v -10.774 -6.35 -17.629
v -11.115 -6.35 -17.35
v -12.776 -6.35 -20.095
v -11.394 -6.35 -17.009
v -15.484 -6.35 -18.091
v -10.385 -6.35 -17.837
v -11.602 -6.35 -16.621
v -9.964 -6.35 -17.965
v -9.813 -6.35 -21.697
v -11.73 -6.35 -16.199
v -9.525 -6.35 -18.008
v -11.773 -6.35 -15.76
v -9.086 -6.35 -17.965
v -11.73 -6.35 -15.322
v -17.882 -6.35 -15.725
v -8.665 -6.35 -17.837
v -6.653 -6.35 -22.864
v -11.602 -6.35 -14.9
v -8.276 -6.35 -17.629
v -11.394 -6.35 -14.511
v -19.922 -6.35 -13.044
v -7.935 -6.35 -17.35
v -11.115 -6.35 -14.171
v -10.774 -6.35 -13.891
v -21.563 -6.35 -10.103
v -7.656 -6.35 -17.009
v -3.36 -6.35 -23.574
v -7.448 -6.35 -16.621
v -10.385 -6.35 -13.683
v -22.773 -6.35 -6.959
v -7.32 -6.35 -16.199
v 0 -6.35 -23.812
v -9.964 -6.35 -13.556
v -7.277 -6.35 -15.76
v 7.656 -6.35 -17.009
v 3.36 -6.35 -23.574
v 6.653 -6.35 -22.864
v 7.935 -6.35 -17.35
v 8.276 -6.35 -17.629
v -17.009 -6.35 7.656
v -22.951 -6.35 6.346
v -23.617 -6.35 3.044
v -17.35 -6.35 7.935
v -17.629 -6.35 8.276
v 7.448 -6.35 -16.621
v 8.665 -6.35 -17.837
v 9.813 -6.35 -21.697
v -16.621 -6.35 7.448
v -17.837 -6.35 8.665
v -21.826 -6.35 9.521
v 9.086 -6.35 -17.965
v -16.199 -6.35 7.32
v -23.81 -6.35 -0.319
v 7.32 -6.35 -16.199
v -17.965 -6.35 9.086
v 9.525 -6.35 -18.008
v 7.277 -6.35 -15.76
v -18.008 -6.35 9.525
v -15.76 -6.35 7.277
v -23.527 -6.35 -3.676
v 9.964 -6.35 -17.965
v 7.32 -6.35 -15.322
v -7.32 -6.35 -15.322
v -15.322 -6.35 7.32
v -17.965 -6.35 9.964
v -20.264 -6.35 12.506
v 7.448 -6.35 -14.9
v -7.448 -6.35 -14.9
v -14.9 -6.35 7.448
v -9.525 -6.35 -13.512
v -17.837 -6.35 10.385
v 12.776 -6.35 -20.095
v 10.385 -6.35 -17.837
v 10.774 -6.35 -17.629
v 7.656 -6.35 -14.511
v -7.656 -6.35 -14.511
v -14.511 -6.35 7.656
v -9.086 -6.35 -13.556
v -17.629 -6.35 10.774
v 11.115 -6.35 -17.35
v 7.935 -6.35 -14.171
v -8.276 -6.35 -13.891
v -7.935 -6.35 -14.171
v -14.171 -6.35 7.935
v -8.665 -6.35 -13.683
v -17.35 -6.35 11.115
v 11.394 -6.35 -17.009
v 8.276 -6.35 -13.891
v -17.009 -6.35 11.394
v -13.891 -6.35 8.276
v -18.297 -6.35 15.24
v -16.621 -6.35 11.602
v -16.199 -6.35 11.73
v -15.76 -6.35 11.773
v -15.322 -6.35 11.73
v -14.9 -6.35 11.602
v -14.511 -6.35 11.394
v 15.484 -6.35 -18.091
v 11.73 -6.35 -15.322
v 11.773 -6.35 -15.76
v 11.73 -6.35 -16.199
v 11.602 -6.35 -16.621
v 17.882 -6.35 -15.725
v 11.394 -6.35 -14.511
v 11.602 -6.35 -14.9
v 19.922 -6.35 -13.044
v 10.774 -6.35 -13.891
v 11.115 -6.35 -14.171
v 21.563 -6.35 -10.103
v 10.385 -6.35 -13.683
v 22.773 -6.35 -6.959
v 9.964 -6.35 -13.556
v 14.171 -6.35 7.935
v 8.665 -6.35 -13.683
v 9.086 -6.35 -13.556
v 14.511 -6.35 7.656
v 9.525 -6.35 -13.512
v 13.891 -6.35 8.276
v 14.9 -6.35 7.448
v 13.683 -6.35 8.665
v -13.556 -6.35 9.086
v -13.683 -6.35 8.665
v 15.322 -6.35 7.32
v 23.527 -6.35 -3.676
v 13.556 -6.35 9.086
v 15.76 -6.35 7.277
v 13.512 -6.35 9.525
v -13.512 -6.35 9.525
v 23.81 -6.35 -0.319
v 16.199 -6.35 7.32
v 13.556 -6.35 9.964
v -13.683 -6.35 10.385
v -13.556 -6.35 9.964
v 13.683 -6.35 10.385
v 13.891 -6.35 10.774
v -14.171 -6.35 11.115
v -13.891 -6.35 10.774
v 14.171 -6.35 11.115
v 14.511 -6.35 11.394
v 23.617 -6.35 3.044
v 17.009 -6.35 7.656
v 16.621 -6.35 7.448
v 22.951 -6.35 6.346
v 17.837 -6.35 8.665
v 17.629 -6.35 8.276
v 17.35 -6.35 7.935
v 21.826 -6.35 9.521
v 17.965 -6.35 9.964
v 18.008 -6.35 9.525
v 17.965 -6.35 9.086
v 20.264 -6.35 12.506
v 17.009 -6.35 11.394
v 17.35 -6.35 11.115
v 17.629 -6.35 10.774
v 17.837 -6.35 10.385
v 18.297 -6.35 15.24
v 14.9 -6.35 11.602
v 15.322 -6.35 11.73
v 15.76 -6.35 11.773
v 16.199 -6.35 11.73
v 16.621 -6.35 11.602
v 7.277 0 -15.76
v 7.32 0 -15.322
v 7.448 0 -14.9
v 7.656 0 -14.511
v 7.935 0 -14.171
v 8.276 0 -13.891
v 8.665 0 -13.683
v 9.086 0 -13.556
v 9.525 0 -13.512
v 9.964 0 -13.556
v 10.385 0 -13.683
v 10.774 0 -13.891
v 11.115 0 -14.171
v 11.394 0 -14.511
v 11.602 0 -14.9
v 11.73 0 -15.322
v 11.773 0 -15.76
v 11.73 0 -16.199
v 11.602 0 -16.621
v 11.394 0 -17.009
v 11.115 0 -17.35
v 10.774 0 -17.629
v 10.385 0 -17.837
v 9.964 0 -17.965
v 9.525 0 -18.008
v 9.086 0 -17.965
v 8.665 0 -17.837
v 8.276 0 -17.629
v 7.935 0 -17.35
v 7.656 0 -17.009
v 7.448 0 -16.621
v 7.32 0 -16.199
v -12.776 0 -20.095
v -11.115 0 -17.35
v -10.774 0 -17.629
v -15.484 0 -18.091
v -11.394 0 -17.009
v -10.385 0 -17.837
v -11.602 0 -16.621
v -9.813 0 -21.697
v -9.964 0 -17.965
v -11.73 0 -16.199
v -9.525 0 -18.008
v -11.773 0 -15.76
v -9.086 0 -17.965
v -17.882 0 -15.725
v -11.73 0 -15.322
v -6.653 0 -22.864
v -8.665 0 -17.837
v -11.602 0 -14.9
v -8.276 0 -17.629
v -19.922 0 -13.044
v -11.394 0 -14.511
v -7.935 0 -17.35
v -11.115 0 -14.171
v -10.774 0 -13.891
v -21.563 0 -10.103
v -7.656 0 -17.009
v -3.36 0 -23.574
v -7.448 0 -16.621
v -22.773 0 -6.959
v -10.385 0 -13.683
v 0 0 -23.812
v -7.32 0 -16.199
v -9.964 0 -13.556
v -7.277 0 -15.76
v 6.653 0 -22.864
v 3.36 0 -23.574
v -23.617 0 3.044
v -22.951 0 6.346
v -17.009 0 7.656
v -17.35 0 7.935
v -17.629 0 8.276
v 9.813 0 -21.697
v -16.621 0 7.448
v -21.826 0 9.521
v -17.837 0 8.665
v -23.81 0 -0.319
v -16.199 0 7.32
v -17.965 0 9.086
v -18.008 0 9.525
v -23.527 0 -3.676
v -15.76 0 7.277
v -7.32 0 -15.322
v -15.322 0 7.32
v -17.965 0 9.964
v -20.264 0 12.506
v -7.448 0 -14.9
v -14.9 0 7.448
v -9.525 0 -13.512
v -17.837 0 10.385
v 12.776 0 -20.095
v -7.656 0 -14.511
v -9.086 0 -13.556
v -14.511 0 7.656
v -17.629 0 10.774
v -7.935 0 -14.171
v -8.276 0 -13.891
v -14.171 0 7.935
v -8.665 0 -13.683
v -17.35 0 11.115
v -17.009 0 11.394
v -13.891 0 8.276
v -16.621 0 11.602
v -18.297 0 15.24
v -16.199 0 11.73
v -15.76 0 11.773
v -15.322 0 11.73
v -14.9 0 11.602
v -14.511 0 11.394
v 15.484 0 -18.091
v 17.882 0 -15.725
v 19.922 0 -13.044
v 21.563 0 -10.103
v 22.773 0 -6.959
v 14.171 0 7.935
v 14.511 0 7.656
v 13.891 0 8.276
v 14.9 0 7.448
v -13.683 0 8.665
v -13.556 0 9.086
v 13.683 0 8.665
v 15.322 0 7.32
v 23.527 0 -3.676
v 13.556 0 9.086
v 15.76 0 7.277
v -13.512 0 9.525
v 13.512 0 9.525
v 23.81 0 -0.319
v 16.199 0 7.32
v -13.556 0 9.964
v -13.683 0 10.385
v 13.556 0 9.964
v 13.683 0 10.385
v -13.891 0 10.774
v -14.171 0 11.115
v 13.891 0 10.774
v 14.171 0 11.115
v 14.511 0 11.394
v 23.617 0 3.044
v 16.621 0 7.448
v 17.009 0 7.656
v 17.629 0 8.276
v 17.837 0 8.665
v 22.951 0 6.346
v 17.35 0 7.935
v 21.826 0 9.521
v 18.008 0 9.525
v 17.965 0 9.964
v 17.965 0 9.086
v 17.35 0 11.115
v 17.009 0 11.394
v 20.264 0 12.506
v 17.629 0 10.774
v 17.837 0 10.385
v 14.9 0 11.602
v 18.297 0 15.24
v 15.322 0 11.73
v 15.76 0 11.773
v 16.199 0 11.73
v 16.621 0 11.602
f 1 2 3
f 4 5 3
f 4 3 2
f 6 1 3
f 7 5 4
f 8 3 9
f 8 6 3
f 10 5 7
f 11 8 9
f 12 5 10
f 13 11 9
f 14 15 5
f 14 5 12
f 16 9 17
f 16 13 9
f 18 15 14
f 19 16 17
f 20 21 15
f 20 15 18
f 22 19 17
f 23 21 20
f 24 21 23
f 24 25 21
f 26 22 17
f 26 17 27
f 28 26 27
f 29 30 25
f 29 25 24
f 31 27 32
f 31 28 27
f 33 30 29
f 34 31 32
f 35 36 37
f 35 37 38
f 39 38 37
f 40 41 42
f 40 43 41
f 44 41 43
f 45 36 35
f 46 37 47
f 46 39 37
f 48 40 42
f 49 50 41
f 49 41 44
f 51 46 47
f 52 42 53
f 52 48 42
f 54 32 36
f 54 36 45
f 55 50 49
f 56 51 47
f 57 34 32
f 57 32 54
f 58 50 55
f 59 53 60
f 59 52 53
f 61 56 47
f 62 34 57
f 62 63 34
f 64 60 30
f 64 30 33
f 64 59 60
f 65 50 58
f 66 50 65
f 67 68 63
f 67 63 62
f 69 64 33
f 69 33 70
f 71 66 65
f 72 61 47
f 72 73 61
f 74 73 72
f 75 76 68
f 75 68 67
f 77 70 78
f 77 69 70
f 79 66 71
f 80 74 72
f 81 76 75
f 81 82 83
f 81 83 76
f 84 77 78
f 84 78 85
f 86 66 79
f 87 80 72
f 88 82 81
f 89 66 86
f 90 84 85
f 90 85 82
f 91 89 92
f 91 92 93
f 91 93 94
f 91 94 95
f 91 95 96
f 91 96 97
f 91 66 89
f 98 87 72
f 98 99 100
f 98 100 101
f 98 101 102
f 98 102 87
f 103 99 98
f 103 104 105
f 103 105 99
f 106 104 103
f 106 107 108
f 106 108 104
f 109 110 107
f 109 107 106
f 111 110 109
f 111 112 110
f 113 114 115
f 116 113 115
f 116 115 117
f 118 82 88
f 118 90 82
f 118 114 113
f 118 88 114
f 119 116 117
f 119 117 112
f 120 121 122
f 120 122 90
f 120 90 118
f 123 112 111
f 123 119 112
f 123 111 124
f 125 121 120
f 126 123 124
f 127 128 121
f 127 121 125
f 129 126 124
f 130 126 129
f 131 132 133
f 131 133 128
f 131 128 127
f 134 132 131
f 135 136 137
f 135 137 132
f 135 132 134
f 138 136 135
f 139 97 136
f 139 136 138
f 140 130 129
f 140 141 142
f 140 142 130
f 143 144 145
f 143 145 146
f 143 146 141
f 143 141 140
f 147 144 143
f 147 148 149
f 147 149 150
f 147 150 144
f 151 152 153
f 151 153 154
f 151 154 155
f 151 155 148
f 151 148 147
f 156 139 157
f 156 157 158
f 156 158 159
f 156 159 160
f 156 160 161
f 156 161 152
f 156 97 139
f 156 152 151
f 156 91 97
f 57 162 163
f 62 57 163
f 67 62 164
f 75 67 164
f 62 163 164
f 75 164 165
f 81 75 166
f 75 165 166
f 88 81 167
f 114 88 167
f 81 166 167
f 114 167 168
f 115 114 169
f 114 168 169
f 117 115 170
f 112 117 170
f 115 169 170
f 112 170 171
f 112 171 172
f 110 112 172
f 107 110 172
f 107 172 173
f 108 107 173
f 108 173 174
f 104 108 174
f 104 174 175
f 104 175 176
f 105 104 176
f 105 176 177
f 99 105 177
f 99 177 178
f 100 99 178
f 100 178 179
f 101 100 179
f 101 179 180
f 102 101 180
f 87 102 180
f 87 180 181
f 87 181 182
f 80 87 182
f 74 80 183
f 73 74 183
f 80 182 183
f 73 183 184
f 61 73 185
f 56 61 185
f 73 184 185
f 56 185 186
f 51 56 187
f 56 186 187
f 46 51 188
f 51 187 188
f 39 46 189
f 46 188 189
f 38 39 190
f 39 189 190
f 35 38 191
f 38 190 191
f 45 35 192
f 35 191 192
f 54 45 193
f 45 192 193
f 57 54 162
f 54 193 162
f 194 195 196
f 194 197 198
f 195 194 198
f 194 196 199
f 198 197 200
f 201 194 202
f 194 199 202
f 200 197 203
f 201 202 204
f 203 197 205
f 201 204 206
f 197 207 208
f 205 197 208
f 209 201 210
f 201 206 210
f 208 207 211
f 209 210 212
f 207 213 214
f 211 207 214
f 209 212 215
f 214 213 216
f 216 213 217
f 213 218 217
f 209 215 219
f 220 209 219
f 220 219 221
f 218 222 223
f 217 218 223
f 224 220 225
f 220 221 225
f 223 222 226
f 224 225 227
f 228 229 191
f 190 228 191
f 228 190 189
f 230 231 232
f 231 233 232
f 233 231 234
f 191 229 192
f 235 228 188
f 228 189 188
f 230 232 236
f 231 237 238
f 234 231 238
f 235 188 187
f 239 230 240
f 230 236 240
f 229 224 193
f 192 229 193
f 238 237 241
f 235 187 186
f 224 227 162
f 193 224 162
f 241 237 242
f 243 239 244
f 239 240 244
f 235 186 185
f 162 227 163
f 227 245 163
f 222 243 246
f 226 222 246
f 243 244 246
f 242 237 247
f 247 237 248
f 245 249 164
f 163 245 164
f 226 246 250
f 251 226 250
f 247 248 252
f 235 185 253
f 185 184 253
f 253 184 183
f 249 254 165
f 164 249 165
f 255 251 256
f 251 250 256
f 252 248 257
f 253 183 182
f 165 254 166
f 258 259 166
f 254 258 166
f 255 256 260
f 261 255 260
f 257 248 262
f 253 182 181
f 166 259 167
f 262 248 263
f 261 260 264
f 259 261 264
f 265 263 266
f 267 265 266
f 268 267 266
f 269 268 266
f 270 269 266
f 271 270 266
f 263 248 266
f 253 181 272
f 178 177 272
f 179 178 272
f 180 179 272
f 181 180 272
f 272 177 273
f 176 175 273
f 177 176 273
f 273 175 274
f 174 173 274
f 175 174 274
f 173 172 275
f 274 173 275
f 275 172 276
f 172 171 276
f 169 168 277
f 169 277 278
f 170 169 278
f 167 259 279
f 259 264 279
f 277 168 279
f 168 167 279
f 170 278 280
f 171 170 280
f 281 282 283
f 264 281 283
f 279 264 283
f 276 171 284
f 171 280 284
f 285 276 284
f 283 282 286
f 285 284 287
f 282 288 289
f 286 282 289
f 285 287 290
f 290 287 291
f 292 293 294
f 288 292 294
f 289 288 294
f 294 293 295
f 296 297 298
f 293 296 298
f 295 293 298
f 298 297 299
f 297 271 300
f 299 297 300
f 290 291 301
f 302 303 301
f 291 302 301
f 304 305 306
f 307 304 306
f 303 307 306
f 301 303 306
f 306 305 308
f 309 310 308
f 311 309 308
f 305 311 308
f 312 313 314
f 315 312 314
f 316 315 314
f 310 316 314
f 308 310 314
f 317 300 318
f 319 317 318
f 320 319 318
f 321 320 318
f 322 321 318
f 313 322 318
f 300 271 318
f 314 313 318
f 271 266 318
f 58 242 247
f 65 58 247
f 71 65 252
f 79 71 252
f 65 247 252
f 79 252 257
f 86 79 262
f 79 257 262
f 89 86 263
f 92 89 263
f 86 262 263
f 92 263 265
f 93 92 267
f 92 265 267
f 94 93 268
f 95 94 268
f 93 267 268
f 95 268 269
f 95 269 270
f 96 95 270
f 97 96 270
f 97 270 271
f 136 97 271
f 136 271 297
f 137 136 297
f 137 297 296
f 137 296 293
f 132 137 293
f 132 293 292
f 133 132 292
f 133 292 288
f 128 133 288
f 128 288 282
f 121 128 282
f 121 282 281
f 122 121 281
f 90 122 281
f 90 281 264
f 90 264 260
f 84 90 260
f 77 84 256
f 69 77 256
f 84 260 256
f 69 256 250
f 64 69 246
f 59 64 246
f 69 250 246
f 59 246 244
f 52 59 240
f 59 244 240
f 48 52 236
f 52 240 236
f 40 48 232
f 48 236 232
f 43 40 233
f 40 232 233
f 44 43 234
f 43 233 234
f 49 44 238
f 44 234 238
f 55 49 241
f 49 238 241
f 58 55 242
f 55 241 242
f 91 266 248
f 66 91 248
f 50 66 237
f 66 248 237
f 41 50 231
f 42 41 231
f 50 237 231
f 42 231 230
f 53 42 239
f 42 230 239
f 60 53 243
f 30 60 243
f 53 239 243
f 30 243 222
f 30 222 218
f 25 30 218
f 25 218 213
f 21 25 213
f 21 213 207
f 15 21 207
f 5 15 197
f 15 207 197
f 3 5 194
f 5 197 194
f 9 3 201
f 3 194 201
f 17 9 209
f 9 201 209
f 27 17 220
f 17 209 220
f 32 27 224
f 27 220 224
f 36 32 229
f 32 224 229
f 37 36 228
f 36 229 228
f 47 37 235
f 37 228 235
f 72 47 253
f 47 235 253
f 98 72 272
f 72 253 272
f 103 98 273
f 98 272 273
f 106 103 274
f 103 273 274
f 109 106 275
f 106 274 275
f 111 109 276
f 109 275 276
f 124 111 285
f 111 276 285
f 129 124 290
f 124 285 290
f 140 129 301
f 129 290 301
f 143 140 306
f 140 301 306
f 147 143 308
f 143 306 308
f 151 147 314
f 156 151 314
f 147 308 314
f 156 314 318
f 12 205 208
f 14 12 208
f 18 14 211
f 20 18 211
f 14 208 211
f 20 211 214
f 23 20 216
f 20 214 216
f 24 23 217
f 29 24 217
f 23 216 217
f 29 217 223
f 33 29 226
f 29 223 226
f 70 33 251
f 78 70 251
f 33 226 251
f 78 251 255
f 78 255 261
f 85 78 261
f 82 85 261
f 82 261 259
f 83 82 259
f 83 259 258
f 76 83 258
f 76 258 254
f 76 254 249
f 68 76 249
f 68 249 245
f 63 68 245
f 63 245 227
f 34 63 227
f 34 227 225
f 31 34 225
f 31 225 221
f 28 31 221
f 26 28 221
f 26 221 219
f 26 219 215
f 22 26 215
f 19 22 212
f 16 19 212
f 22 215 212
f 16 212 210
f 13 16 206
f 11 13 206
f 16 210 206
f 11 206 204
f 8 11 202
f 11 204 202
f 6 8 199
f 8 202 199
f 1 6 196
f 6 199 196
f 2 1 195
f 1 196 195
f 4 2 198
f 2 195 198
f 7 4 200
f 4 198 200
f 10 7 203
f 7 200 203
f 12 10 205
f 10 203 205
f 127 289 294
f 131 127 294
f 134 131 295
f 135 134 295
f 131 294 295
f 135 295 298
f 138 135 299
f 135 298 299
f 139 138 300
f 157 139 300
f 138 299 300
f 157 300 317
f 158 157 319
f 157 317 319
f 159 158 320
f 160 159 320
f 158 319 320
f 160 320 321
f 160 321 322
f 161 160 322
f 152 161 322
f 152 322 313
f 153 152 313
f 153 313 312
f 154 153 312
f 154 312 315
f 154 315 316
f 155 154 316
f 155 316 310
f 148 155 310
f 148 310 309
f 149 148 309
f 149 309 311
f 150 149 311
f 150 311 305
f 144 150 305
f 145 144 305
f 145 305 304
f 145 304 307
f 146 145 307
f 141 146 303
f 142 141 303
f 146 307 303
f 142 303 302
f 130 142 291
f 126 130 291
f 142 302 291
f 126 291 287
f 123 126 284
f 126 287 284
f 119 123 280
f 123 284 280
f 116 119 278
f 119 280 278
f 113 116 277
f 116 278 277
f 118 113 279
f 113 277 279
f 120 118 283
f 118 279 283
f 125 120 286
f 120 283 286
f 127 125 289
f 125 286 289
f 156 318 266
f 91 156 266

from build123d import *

# Parameters (mm, degrees)
F1_DEPTH = 6.35
F3_D     = 4.4958


with BuildPart() as f1:
    # F0 (on Front) → F1 (new body)
    with BuildSketch(Plane.XZ):
        with BuildLine():
            Line((18.2969275085, 15.24), (-18.2969275085, 15.24))
            ThreePointArc((-18.2969275085, 15.24), (0, -23.8125), (18.2969275085, 15.24))
        make_face()
    extrude(amount=F1_DEPTH)

    # F3 (through all)
    with Locations(Plane.XZ.offset(6.35)):
        with Locations((-15.7602855304, 9.525), (15.7602855304, 9.525), (-9.525, -15.7602855304), (9.525, -15.7602855304)):
            Hole(F3_D / 2)


solid = f1.part
